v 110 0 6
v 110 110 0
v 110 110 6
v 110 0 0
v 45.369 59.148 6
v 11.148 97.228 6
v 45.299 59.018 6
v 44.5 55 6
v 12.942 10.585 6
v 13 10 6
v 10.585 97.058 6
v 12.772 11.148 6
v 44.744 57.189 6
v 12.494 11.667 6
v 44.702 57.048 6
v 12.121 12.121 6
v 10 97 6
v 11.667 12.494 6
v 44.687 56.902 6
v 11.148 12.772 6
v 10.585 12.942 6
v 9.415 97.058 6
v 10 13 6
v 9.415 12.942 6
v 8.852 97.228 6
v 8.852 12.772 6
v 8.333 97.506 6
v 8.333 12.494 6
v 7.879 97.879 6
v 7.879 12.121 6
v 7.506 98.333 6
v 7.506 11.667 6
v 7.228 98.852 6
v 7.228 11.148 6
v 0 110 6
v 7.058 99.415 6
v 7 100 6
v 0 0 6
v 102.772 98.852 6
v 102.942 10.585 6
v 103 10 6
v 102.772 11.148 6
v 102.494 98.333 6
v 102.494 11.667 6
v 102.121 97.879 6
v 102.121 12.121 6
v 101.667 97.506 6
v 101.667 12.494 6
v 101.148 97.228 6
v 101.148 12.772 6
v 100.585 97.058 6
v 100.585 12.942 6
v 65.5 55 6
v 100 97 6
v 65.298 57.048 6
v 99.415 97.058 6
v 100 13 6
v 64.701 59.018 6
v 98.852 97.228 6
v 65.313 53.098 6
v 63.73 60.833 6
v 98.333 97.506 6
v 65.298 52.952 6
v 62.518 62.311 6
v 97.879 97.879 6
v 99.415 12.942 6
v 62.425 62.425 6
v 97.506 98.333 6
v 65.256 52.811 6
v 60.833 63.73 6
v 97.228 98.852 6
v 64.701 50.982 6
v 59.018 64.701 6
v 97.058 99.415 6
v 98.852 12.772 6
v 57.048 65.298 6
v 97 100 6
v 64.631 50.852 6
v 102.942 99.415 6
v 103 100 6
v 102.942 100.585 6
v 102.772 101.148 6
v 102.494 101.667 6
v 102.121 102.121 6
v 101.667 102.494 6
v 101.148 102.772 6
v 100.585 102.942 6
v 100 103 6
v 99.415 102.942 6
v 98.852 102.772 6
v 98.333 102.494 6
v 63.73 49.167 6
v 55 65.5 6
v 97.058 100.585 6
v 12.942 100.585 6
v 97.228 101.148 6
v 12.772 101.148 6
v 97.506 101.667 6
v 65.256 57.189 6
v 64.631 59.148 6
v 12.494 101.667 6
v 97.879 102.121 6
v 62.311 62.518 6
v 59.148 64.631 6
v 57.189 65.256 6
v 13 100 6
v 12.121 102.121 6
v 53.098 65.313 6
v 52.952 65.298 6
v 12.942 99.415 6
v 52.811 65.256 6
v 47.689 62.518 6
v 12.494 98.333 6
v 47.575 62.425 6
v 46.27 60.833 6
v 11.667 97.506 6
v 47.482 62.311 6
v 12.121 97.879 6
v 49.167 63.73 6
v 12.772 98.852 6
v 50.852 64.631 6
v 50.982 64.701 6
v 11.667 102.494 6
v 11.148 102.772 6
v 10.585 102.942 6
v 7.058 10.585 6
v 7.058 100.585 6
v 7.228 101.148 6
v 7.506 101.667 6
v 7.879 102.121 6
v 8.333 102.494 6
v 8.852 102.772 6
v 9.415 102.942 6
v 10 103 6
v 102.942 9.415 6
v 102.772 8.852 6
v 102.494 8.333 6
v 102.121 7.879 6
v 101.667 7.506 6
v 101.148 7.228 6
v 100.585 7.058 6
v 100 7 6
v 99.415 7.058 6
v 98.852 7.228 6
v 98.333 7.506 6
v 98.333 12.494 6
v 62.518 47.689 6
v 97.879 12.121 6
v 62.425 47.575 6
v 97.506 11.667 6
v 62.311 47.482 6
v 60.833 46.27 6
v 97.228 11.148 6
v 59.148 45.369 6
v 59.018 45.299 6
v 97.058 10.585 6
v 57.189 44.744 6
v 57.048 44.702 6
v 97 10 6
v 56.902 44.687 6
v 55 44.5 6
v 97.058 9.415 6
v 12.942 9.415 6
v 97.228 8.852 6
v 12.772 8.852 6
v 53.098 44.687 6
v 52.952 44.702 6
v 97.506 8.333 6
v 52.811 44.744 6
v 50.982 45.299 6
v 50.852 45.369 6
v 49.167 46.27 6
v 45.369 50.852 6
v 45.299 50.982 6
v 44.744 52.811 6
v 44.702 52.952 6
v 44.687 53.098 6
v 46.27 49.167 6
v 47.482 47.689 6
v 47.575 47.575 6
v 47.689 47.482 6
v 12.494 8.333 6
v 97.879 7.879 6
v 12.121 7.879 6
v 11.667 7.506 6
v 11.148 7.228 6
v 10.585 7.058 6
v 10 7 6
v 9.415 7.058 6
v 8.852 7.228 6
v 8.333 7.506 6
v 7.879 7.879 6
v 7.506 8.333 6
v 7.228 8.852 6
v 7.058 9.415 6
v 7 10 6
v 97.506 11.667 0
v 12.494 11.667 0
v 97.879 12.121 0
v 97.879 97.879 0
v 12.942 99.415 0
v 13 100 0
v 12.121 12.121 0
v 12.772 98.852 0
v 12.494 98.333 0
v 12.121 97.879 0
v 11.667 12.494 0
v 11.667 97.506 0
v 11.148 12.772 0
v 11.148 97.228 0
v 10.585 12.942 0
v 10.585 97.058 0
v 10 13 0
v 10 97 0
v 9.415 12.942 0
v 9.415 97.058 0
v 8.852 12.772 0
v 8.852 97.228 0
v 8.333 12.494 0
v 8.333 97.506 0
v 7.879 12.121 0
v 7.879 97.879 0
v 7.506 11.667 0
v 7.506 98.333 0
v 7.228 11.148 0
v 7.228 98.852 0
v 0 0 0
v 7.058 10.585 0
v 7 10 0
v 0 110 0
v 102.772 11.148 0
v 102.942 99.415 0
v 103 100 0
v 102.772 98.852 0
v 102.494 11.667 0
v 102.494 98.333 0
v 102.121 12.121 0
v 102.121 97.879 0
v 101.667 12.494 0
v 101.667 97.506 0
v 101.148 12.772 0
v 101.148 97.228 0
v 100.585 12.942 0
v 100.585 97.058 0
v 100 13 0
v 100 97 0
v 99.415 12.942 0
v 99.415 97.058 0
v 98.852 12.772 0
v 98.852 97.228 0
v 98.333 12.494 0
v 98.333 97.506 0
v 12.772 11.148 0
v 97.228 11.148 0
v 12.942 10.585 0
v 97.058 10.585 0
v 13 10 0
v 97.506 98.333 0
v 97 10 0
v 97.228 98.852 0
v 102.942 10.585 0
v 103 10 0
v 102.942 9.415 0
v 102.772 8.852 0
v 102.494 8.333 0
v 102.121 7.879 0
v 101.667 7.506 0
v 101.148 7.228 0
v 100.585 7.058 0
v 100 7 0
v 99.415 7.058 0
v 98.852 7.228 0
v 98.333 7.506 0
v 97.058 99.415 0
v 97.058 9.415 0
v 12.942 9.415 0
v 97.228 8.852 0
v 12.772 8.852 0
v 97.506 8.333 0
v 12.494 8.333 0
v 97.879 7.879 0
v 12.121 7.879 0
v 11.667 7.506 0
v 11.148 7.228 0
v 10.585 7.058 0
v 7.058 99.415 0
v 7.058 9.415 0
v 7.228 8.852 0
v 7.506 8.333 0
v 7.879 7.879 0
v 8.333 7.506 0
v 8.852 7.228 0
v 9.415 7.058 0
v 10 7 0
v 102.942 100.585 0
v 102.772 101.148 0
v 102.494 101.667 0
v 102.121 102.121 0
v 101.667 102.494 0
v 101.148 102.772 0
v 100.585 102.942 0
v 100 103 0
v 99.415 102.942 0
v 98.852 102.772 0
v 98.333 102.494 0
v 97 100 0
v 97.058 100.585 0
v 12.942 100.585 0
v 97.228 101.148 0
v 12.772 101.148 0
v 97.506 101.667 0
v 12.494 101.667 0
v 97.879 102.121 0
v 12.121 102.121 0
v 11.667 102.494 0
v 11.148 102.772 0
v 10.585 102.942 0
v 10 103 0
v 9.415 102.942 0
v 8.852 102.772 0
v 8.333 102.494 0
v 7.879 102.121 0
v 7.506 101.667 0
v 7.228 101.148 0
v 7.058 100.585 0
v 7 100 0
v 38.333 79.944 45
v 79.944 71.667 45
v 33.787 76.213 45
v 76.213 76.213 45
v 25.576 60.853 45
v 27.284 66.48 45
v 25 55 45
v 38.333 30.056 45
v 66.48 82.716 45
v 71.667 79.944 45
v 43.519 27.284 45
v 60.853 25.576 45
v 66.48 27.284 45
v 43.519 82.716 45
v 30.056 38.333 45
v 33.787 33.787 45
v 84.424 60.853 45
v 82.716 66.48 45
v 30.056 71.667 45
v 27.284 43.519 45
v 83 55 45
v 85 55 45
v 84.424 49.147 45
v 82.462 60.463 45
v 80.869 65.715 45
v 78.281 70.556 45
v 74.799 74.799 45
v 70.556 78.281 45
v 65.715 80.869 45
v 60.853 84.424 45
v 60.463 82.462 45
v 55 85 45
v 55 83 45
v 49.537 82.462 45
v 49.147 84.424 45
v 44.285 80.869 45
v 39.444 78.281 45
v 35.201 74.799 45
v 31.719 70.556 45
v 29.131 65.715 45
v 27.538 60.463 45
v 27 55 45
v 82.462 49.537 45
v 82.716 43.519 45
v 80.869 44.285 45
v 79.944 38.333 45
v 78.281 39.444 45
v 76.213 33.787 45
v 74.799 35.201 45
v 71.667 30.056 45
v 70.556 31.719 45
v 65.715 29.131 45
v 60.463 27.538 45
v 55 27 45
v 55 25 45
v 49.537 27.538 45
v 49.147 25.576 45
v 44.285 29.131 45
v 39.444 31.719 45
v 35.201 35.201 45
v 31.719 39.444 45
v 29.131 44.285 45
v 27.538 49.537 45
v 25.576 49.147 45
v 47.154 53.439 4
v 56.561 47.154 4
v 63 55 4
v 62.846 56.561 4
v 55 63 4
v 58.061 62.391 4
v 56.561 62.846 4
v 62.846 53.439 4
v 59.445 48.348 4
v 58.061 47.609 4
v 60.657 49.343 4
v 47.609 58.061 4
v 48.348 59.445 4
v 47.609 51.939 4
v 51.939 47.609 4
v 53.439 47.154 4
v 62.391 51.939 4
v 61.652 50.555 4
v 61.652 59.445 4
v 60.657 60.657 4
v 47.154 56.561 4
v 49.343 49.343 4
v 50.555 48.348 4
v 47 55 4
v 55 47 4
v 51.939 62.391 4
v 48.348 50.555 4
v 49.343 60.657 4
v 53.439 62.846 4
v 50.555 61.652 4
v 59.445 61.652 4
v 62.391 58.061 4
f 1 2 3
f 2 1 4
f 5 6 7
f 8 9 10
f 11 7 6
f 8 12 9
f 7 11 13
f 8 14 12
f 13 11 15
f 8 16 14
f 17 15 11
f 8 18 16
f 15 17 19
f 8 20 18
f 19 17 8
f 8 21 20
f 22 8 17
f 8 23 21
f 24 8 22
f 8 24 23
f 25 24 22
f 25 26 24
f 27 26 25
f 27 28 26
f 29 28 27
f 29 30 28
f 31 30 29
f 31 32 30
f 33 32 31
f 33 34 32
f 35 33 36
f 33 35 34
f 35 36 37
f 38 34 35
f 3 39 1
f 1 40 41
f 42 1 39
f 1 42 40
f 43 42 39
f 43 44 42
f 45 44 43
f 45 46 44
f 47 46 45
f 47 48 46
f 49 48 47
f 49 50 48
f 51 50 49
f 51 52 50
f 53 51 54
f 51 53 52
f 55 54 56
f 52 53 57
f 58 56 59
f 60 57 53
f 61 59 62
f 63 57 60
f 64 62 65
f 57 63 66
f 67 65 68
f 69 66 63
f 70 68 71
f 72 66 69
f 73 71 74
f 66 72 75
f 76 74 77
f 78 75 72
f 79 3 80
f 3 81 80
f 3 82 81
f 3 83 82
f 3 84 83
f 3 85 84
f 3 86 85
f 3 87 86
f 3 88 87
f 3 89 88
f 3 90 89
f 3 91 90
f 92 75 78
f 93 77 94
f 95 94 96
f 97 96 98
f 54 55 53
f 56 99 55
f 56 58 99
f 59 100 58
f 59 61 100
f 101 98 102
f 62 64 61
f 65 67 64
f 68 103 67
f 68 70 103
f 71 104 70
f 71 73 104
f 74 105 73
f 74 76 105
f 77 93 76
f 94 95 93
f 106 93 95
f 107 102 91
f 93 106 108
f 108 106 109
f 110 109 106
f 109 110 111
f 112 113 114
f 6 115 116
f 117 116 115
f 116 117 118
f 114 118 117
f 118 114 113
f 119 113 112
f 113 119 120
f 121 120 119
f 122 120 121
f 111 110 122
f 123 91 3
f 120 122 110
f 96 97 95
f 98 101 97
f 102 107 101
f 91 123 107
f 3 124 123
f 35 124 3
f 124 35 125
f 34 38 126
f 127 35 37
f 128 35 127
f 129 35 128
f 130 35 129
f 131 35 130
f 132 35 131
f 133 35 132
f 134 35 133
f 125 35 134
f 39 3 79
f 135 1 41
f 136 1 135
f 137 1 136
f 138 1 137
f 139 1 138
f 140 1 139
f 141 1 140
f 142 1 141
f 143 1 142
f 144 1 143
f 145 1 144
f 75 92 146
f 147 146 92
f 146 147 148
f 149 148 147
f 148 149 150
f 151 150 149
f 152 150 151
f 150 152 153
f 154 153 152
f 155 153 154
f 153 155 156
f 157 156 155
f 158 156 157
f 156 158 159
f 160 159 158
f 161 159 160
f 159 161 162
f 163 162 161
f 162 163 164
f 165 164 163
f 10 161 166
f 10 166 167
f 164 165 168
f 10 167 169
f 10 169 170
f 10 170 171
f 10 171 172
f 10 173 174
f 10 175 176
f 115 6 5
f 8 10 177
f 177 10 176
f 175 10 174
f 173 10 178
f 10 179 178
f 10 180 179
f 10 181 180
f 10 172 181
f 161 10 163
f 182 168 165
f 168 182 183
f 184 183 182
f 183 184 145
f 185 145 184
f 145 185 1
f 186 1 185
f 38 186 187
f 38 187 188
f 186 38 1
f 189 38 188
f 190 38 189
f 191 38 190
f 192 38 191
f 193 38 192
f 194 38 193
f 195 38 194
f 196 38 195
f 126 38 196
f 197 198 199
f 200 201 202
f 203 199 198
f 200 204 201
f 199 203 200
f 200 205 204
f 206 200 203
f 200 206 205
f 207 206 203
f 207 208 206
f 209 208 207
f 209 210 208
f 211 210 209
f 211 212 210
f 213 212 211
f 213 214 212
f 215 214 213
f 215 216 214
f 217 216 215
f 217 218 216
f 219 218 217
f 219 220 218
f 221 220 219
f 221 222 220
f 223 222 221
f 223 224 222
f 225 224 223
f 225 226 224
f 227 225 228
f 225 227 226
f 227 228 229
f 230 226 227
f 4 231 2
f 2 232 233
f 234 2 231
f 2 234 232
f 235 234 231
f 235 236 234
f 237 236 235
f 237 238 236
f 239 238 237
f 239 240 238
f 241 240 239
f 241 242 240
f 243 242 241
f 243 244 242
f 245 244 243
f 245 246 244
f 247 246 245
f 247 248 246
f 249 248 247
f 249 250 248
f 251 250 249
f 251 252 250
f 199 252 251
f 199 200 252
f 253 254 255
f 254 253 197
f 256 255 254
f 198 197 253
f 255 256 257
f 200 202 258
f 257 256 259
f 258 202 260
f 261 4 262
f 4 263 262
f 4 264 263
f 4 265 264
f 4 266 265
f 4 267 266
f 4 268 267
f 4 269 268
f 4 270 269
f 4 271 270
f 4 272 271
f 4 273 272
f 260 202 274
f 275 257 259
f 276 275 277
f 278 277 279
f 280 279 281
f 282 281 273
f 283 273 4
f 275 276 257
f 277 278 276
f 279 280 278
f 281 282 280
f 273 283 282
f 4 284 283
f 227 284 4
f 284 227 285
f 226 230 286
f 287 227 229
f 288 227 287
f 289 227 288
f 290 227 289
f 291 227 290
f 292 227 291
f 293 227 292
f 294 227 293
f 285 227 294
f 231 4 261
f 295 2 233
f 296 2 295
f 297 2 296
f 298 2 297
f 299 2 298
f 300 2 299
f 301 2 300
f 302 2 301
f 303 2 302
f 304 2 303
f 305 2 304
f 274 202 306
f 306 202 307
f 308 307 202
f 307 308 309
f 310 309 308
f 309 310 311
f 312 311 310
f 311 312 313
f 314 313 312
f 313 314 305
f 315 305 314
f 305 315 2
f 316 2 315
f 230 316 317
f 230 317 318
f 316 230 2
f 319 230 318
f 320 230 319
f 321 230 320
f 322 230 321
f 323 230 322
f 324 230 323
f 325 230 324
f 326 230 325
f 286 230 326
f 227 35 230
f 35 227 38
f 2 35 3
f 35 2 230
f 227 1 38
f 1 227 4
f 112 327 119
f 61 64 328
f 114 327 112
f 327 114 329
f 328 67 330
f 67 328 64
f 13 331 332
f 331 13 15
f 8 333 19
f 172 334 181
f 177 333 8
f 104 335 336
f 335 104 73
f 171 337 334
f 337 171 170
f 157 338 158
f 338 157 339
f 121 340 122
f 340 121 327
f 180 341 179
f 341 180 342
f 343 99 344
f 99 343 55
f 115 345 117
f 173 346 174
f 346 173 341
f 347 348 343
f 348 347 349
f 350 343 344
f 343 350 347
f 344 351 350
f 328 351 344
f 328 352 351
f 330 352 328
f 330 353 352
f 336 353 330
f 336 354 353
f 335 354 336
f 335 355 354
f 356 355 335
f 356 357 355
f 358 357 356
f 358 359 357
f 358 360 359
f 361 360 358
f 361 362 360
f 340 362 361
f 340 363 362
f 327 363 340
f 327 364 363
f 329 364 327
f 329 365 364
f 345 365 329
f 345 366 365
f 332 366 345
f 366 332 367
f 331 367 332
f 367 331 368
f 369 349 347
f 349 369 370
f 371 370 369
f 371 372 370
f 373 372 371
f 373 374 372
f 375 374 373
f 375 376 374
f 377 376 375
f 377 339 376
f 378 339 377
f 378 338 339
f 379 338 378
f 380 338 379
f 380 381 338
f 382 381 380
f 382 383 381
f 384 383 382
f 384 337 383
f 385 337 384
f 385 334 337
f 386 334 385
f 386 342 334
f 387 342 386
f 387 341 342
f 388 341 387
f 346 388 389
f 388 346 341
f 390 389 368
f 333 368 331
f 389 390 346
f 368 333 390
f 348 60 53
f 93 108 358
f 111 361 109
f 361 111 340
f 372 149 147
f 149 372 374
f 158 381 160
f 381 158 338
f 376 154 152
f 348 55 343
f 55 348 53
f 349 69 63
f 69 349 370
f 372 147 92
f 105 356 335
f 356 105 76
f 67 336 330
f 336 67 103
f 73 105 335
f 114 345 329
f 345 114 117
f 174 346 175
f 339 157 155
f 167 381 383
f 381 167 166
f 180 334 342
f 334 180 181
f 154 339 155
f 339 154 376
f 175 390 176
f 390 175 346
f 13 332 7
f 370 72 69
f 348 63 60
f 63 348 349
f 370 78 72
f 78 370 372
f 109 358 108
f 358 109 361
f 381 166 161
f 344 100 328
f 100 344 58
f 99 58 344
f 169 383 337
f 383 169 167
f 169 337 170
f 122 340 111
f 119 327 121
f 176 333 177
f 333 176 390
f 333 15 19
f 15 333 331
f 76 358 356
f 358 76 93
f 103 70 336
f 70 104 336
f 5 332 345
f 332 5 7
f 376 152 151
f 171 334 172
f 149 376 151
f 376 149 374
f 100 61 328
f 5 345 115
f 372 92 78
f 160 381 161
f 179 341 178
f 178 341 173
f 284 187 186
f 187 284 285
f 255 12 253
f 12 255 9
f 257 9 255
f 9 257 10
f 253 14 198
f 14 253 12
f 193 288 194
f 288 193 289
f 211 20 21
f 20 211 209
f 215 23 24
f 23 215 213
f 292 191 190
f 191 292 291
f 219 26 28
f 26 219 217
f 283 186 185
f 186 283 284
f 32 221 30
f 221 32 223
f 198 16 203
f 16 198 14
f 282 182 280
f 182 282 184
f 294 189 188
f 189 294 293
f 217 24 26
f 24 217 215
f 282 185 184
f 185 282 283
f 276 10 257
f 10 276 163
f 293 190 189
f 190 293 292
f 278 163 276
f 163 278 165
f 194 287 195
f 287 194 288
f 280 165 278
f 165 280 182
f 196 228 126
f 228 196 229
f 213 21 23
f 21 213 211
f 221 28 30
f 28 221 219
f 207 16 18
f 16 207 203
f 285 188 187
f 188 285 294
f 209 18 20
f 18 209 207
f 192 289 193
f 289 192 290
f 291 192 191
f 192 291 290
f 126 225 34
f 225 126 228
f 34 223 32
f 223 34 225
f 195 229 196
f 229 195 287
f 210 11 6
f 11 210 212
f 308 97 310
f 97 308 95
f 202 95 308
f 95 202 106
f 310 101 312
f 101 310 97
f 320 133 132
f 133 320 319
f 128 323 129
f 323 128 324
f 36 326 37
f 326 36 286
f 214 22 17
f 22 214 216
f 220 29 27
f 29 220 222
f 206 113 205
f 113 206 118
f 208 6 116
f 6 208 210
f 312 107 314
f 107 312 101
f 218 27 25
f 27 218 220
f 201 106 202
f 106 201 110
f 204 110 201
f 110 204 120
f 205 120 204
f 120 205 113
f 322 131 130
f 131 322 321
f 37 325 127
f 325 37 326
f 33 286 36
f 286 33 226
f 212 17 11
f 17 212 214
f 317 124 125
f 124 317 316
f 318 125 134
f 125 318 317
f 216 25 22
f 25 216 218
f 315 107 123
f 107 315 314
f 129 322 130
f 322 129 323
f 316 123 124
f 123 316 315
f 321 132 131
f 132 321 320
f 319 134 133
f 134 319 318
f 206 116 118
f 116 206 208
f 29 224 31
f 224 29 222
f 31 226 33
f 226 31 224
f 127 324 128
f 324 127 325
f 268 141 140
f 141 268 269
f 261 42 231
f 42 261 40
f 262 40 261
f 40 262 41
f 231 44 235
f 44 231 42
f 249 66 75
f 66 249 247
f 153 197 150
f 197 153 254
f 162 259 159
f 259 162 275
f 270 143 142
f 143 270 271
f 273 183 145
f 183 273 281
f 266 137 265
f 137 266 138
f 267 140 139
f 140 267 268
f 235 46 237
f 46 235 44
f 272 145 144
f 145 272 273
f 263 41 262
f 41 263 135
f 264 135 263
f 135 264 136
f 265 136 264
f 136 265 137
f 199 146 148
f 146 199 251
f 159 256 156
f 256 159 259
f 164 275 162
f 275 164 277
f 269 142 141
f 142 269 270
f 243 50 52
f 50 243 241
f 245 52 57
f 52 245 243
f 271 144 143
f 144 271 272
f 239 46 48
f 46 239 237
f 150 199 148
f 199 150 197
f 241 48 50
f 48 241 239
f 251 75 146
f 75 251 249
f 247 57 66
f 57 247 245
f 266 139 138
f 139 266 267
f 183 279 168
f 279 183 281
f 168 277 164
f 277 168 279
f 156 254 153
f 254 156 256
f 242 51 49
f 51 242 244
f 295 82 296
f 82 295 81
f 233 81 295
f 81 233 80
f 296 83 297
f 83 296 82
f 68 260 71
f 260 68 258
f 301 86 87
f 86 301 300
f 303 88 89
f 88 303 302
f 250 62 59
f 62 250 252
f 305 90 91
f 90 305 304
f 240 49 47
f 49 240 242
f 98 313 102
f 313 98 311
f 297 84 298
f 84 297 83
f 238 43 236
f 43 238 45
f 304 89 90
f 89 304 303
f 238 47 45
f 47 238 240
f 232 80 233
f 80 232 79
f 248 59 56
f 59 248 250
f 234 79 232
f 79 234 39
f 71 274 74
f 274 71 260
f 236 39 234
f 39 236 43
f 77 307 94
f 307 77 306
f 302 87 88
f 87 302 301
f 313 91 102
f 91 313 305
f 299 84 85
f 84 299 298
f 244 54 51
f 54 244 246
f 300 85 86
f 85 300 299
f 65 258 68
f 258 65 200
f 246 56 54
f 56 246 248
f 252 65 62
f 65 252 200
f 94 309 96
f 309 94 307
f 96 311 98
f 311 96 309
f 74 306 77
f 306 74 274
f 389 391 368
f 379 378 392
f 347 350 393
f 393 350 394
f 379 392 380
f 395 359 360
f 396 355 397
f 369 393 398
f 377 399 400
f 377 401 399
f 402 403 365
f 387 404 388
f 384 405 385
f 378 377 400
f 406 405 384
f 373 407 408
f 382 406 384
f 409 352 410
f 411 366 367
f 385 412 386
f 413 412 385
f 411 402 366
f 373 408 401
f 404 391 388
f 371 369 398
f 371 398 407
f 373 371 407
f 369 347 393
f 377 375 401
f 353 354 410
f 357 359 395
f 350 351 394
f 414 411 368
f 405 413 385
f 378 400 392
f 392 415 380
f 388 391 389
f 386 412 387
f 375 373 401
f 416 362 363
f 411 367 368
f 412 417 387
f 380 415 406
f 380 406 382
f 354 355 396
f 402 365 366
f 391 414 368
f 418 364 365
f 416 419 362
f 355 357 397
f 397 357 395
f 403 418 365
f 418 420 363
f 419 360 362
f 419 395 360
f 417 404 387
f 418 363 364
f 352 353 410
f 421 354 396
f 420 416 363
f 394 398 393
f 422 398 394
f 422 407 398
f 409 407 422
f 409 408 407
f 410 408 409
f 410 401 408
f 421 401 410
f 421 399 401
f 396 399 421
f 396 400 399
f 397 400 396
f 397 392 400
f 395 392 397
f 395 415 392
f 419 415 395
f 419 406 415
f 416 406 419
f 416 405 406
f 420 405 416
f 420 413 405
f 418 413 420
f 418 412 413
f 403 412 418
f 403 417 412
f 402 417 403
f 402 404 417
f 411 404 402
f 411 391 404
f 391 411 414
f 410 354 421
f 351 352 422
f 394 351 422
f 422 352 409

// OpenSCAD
$fn = 32;

// ----------------------------------------------------------------------
// Hopper: flanged with square flange
// ----------------------------------------------------------------------

// --- parameters (mm) ---
fl = 110;                 // flange side, X and Y
fl_t = 6;                 // flange thickness
cone_h = 40;              // cone height above the flange
top_d = 60;               // cone mouth diameter
bot_d = 20;               // cone spout diameter
wall = 2;                 // cone wall thickness
hole_r = 3;               // flange hole radius
hole_in = 10;             // hole inset from the corners

bore_d = bot_d - 2 * wall;  // spout bore diameter
total_h = fl_t + cone_h - 1;  // overall height

difference() {
  union() {
    cube([fl, fl, fl_t]);
    translate([fl / 2, fl / 2, fl_t - 1])
      cylinder(h = cone_h, d1 = bot_d, d2 = top_d);
  }
  translate([fl / 2, fl / 2, fl_t - 2])
    cylinder(h = cone_h + 1, d1 = bore_d, d2 = top_d - 2 * wall);
  for (sx = [0, 1], sy = [0, 1])
    translate([sx ? fl - hole_in : hole_in,
               sy ? fl - hole_in : hole_in, -1])
      cylinder(r = hole_r, h = fl_t + 2);
}
